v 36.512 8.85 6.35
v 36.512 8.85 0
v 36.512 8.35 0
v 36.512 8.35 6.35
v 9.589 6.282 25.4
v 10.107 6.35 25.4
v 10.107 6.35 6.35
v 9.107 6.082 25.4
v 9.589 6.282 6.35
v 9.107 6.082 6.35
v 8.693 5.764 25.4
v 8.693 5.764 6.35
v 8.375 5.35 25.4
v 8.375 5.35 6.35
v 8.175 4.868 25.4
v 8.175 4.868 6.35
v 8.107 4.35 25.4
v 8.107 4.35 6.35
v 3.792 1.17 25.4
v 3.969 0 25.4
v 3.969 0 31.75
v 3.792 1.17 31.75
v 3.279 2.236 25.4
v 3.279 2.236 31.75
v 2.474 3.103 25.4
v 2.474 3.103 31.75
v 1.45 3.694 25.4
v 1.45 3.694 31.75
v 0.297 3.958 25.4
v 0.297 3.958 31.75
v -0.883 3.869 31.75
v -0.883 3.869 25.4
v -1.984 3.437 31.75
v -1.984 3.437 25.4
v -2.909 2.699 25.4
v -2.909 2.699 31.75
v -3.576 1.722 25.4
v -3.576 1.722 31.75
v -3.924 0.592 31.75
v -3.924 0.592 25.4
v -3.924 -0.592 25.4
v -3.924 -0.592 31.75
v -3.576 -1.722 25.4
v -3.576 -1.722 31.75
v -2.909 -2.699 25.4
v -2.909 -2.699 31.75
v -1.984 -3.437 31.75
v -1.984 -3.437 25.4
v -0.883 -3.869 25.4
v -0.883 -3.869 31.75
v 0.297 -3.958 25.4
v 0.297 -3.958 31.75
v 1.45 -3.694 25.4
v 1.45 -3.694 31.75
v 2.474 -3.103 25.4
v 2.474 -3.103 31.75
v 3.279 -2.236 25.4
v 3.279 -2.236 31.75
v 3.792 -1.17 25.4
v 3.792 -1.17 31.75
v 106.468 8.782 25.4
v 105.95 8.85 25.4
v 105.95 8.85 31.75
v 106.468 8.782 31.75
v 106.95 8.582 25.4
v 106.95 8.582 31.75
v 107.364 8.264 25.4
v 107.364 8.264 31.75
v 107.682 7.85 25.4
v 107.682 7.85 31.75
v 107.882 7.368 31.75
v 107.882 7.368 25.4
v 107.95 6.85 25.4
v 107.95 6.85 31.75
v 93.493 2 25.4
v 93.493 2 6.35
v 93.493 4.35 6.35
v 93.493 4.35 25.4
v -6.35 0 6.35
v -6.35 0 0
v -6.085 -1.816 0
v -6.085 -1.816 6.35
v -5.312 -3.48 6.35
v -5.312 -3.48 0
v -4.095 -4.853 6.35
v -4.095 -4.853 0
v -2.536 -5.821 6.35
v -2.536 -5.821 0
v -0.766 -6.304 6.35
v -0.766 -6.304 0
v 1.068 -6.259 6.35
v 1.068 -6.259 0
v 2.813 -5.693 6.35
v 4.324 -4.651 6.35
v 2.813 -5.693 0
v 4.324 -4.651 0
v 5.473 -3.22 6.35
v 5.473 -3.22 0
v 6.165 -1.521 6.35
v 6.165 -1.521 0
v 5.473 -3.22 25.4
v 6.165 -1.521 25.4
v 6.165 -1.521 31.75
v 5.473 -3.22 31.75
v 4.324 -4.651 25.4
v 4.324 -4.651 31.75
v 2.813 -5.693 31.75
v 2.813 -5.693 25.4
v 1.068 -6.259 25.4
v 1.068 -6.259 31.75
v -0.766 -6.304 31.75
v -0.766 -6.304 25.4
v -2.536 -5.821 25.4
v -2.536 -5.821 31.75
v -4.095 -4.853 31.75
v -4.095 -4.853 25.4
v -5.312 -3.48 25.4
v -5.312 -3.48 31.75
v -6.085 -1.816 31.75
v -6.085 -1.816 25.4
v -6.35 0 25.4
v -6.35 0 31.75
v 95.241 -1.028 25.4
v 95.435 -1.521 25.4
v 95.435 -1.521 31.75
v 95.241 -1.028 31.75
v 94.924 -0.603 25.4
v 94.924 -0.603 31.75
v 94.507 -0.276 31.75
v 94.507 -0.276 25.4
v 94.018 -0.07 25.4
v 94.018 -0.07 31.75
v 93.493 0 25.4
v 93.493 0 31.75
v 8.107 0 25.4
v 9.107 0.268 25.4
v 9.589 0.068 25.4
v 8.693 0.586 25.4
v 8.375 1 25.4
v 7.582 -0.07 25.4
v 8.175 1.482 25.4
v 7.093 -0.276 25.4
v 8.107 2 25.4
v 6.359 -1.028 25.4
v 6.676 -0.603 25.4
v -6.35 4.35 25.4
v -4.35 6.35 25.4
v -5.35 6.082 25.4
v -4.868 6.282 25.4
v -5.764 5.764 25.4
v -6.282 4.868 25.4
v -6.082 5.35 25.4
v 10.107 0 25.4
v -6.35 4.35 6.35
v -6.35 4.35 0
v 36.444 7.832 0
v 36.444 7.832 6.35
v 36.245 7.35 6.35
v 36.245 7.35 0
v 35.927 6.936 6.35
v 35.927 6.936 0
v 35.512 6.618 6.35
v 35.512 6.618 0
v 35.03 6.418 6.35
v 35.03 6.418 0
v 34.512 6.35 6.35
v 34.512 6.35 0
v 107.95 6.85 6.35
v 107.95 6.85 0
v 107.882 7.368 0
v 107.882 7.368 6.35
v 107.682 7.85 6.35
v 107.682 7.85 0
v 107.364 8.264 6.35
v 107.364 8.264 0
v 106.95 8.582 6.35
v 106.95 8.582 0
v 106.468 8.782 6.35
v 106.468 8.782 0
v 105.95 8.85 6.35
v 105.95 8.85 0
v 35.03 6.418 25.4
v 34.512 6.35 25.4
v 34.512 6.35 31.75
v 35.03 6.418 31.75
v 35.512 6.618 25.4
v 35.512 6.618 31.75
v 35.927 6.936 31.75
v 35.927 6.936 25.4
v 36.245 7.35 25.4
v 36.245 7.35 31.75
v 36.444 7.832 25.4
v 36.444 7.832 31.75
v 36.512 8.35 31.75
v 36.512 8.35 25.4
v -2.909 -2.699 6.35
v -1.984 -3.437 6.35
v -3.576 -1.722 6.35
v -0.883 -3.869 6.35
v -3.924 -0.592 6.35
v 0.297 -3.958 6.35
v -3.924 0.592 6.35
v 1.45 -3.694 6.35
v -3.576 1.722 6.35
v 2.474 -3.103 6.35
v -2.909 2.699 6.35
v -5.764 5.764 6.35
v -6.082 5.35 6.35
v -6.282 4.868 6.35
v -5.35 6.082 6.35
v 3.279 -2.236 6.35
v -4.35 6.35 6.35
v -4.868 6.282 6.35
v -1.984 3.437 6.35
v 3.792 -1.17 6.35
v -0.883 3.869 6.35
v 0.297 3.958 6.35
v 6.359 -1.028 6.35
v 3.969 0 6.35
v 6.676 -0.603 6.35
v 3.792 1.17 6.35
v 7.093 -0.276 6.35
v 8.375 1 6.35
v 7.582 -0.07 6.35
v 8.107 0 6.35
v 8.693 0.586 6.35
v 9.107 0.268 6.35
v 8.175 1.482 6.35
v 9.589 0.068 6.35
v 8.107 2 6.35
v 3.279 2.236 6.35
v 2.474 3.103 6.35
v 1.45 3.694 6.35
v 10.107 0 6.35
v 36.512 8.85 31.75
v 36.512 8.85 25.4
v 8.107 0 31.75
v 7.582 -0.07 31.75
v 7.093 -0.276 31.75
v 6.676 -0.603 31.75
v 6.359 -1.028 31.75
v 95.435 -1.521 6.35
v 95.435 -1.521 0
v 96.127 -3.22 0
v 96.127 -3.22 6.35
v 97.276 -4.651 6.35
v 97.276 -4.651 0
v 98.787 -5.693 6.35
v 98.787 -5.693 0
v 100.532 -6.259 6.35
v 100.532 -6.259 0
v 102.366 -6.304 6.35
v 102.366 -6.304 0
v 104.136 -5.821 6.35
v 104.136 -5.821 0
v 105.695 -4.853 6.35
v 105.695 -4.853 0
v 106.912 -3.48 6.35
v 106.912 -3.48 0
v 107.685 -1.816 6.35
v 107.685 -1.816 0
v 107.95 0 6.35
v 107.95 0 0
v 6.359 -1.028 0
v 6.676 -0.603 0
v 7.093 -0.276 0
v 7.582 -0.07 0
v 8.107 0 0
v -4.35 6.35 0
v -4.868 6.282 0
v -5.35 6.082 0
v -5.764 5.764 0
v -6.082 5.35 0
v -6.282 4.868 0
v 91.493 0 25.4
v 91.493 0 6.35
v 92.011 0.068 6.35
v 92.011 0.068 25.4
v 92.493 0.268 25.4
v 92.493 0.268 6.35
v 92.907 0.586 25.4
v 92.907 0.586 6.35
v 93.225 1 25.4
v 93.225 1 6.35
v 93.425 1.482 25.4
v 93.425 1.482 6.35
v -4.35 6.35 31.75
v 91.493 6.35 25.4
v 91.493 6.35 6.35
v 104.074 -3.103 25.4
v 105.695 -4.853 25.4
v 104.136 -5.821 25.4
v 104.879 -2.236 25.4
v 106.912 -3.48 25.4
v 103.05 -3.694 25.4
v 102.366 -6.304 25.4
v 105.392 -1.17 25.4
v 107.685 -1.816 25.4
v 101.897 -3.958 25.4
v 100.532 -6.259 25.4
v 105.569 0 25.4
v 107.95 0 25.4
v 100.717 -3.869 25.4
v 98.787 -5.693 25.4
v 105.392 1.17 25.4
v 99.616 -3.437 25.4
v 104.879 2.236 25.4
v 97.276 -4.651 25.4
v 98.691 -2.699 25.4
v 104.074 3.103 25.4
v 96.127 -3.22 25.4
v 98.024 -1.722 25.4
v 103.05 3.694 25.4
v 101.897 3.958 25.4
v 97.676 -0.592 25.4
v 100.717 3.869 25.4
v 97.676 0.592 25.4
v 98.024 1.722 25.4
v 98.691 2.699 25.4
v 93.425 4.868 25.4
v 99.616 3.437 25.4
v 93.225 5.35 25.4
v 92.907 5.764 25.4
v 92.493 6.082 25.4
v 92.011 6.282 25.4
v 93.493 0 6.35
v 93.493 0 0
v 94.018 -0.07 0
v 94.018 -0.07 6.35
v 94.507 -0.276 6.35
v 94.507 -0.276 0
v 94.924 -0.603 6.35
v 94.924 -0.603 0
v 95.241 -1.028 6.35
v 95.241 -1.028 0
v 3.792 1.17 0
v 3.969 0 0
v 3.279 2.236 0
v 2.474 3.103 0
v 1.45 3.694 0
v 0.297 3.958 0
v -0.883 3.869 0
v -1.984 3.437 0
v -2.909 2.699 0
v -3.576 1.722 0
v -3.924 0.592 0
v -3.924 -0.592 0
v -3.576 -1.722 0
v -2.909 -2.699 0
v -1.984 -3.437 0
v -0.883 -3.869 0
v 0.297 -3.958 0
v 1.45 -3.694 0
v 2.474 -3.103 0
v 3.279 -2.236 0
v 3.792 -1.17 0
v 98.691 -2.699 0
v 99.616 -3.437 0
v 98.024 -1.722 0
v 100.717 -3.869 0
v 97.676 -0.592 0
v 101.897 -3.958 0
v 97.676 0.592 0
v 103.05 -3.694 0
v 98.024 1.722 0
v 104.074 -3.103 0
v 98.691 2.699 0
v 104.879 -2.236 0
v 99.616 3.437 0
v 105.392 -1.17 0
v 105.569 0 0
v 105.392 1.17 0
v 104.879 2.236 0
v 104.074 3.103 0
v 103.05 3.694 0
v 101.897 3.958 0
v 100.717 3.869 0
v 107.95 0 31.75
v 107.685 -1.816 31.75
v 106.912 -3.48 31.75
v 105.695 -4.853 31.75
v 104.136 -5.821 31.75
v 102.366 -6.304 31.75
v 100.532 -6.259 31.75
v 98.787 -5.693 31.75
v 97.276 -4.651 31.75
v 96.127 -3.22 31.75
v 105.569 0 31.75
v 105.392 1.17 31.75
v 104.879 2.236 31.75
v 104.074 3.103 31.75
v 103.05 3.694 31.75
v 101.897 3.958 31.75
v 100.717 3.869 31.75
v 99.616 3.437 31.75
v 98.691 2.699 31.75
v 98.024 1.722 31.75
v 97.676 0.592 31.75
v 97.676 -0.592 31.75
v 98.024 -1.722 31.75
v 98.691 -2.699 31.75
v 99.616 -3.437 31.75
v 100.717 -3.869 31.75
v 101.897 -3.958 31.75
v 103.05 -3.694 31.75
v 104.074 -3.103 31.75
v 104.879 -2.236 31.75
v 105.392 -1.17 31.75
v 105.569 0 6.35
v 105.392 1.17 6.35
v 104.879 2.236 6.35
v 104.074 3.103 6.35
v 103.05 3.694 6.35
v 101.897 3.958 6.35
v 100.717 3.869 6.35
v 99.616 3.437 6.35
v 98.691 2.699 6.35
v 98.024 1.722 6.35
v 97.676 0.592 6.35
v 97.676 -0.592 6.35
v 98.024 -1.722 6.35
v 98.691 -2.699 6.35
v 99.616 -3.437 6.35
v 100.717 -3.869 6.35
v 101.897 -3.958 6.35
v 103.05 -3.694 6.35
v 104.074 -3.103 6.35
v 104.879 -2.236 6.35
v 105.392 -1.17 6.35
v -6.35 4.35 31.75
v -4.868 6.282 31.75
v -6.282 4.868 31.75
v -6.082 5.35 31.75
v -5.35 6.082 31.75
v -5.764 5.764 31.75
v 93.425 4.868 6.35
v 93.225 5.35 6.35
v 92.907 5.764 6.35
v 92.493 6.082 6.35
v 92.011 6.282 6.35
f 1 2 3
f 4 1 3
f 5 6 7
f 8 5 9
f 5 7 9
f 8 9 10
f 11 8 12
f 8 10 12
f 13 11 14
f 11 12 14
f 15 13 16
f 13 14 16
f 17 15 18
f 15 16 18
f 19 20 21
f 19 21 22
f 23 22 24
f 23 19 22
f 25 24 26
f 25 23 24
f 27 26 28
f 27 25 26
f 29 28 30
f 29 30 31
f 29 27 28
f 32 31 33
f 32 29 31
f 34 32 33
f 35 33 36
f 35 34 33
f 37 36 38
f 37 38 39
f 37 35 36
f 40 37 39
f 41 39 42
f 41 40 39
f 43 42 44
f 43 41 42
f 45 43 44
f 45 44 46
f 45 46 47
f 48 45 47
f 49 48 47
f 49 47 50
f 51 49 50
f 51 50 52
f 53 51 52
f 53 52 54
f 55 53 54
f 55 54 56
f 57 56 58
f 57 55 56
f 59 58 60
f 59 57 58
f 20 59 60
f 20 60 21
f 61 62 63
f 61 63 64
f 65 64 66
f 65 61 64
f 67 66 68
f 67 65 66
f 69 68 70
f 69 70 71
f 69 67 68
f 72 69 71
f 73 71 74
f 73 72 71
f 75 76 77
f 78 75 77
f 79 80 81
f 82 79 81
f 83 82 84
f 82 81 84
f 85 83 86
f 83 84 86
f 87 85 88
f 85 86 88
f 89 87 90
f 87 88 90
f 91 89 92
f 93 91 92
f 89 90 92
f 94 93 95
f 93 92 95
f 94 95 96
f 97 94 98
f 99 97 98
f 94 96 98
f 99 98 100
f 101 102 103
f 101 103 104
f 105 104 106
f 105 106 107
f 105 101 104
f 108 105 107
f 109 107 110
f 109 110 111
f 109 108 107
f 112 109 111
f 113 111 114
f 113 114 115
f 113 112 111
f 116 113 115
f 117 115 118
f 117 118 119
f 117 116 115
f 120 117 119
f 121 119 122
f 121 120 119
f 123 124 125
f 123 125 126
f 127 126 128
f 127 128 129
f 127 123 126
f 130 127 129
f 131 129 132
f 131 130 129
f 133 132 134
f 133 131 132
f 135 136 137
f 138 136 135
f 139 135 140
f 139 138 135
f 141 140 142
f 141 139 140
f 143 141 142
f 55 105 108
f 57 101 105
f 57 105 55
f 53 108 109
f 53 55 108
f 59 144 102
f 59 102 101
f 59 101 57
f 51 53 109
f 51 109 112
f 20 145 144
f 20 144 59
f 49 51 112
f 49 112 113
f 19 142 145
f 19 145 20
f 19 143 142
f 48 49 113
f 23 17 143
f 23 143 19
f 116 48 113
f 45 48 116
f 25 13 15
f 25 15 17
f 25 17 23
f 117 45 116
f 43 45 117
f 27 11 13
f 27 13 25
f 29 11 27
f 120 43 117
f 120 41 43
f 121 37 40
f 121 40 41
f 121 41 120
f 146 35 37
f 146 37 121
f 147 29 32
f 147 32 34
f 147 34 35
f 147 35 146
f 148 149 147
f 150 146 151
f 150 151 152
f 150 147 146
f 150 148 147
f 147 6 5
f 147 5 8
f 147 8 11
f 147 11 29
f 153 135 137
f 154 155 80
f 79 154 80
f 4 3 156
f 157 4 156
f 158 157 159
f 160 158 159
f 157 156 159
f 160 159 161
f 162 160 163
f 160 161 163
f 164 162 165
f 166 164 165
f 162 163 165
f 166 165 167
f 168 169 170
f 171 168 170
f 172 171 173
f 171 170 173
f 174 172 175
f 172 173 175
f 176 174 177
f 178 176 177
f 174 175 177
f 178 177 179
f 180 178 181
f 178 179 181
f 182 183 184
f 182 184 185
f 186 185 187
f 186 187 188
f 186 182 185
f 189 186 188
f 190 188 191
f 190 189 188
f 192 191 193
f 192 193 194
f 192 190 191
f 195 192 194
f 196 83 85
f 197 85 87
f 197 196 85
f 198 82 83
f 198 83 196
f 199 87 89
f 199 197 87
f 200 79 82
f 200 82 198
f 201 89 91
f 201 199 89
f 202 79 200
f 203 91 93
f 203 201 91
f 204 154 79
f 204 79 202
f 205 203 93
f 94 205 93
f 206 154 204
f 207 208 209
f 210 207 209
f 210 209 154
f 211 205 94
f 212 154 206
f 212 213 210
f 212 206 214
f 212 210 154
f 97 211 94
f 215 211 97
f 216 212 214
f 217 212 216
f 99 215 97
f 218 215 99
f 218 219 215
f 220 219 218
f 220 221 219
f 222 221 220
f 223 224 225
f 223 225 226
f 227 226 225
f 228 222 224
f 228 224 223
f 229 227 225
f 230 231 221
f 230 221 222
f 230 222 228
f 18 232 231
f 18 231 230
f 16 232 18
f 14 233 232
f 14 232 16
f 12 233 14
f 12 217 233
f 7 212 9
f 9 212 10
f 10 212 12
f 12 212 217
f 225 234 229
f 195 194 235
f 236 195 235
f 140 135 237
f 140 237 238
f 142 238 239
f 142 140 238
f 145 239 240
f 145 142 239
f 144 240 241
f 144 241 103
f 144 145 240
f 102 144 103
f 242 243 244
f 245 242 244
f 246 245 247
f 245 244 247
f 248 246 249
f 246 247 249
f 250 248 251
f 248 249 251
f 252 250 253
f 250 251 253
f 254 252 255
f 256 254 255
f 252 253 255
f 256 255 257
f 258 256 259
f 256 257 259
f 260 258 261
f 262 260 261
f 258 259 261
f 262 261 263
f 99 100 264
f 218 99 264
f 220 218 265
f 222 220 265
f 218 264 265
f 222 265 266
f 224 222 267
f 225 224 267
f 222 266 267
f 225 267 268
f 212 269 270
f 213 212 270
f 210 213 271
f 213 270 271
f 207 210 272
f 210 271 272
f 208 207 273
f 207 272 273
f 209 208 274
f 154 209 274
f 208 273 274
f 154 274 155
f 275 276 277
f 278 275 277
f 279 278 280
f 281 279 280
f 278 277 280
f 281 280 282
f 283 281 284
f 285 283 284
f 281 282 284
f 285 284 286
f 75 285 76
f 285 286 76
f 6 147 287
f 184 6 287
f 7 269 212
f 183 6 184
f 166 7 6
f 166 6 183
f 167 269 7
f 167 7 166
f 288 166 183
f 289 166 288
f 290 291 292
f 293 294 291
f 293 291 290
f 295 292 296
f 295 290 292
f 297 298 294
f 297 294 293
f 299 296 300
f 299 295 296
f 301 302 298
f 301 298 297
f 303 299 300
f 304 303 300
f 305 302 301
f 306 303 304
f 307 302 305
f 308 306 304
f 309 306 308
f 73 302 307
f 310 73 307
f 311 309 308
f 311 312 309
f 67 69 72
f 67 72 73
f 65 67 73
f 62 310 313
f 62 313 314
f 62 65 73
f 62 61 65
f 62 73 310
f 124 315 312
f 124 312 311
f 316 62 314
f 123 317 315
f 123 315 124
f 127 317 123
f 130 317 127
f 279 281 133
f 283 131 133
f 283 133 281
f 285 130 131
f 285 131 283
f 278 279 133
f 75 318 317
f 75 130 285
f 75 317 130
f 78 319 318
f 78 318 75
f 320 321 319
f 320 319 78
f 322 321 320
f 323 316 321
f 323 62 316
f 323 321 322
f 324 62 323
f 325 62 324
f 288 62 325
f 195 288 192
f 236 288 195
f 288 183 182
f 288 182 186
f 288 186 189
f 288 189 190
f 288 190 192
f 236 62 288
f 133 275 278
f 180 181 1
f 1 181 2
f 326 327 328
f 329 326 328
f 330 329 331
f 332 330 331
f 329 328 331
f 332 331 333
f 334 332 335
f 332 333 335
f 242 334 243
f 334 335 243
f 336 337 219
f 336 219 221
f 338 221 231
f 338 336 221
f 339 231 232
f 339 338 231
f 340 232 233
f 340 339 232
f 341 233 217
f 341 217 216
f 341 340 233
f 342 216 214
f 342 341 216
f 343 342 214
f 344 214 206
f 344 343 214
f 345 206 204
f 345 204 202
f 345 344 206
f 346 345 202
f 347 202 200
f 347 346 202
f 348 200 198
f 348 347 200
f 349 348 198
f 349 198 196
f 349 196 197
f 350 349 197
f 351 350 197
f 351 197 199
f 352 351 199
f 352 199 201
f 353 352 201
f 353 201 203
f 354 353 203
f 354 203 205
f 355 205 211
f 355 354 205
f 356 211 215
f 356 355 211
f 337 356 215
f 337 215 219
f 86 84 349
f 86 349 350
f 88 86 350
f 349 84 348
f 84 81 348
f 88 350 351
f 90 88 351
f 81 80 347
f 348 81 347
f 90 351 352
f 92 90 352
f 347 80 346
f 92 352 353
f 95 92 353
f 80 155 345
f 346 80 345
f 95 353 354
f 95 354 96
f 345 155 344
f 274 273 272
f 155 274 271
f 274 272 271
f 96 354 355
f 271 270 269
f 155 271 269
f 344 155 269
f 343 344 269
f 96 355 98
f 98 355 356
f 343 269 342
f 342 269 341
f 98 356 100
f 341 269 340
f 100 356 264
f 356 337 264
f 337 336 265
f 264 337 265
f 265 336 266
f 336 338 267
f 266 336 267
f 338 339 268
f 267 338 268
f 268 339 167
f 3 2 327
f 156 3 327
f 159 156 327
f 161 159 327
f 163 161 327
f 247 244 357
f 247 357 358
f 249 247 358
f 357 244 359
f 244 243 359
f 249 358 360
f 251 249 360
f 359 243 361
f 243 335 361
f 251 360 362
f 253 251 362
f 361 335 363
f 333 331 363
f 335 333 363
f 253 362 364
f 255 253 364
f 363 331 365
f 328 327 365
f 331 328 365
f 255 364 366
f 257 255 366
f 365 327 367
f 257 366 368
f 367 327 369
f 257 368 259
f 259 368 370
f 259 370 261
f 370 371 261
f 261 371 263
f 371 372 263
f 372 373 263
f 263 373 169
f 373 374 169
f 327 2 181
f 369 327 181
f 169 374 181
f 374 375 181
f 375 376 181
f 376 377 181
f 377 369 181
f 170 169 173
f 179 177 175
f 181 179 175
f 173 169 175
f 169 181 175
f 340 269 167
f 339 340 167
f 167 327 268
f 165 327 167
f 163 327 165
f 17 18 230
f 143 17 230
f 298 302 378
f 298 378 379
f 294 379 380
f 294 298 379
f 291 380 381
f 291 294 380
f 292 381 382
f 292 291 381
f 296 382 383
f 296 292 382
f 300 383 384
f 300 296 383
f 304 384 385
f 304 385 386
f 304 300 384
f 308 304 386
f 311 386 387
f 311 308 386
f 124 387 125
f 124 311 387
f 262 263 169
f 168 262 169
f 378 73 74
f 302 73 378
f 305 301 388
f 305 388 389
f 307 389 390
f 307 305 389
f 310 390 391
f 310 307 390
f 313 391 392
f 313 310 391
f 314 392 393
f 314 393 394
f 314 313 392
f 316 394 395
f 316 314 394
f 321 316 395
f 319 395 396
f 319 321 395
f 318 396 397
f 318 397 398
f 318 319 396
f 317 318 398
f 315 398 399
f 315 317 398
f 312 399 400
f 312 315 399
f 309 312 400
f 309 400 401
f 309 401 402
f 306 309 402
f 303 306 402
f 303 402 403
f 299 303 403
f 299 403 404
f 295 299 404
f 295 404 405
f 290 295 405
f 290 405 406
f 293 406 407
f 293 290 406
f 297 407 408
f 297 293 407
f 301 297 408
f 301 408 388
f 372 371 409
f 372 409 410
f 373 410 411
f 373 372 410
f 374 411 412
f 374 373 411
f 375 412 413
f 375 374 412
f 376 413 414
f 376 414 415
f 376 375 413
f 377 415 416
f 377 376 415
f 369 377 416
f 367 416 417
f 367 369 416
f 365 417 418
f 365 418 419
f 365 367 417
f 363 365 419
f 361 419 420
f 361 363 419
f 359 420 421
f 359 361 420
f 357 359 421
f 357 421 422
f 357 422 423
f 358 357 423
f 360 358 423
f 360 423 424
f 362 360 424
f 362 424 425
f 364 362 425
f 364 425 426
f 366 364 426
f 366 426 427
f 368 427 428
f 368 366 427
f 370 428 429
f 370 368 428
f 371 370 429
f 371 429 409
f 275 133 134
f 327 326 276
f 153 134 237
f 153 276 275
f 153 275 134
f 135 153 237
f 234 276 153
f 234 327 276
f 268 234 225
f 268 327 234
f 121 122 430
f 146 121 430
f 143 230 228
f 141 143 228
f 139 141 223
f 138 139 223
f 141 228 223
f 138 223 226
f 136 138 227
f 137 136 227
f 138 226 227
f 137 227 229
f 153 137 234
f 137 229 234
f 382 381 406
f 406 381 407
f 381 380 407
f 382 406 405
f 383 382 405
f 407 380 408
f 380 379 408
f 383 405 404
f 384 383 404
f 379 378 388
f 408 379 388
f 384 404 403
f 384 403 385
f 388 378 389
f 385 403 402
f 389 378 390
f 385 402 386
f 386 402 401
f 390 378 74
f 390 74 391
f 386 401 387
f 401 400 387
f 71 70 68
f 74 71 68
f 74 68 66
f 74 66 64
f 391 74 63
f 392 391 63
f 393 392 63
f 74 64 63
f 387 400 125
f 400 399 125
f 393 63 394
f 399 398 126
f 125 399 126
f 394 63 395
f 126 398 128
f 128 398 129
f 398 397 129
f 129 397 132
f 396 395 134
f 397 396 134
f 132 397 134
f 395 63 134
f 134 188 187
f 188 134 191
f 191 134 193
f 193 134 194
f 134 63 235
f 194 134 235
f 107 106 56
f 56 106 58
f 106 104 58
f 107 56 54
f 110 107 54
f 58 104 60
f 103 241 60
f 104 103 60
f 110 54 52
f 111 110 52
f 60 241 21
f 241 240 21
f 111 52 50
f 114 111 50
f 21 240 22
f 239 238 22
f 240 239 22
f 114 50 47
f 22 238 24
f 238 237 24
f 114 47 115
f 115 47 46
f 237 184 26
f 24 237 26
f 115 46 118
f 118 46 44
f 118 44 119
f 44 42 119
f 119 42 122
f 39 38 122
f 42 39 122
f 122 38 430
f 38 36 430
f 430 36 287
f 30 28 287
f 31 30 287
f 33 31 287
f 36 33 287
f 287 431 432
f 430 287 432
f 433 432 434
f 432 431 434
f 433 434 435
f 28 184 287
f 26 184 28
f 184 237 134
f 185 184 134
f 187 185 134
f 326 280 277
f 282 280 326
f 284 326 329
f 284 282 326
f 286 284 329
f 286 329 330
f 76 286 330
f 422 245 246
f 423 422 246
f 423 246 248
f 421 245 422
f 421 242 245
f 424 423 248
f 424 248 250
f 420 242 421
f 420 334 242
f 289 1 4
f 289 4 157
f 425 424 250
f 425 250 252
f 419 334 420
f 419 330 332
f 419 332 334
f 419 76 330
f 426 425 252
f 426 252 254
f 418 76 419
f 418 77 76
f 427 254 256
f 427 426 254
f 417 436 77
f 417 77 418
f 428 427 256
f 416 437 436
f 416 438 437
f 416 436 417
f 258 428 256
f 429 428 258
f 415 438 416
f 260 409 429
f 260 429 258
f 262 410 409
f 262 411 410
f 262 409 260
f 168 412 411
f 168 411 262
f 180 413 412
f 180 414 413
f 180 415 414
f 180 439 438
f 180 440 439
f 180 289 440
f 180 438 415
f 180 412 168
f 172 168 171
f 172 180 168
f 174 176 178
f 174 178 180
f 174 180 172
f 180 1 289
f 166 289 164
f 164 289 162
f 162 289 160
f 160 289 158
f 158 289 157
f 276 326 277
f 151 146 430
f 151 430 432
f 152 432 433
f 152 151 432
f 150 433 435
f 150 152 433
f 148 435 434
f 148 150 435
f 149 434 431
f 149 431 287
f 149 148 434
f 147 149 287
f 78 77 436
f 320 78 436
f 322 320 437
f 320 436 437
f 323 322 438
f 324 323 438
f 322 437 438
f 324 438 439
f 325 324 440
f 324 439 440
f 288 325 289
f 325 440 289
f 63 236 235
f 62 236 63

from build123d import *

# Parameters (mm, degrees)
SKETCH1_R           = 3.96875
BOSS_EXTRUDE1_DEPTH = 6.35
BOSS_EXTRUDE2_DEPTH = 19.05
SKETCH4_R           = 3.96875
BOSS_EXTRUDE3_DEPTH = 6.35


with BuildPart() as part:
    # Sketch1 → Boss-Extrude1 (new body)
    with BuildSketch(Plane.XY):
        with BuildLine():
            Line((105.95, 8.85), (36.5125, 8.85))
            Line((36.5125, 8.85), (36.5125, 8.35))
            ThreePointArc((36.5125, 8.35), (35.926713562, 6.935786438), (34.5125, 6.35))
            Line((34.5125, 6.35), (-4.35, 6.35))
            ThreePointArc((-4.35, 6.35), (-5.764213562, 5.764213562), (-6.35, 4.35))
            Line((-6.35, 4.35), (-6.35, 0))
            ThreePointArc((-6.35, 0), (-4.490128061, -4.490128061), (0, -6.35))
            ThreePointArc((0, -6.35), (3.915636357, -4.999029097), (6.165159082, -1.520958084))
            ThreePointArc((6.165159082, -1.520958084), (6.873670176, -0.425502647), (8.10694147, 0))
            Line((8.10694147, 0), (93.49305853, 0))
            ThreePointArc((93.49305853, 0), (94.726329824, -0.425502647), (95.434840918, -1.520958084))
            ThreePointArc((95.434840918, -1.520958084), (97.684363643, -4.999029097), (101.6, -6.35))
            ThreePointArc((101.6, -6.35), (106.090128061, -4.490128061), (107.95, 0))
            Line((107.95, 0), (107.95, 6.85))
            ThreePointArc((107.95, 6.85), (107.364213562, 8.264213562), (105.95, 8.85))
        make_face()
        Circle(SKETCH1_R, mode=Mode.SUBTRACT)
        with Locations((101.6, 0)):
            Circle(SKETCH1_R, mode=Mode.SUBTRACT)
    extrude(amount=BOSS_EXTRUDE1_DEPTH)

    # Sketch3 → Boss-Extrude2 (add)
    with BuildSketch(Plane.XY.offset(6.35)):
        with BuildLine():
            Line((91.49305853, 6.35), (10.10694147, 6.35))
            ThreePointArc((10.10694147, 6.35), (8.692727908, 5.764213562), (8.10694147, 4.35))
            Line((8.10694147, 4.35), (8.10694147, 2))
            ThreePointArc((8.10694147, 2), (8.692727908, 0.585786438), (10.10694147, 0))
            Line((10.10694147, 0), (91.49305853, 0))
            ThreePointArc((91.49305853, 0), (92.907272092, 0.585786438), (93.49305853, 2))
            Line((93.49305853, 2), (93.49305853, 4.35))
            ThreePointArc((93.49305853, 4.35), (92.907272092, 5.764213562), (91.49305853, 6.35))
        make_face()
    extrude(amount=BOSS_EXTRUDE2_DEPTH)

    # Sketch4 → Boss-Extrude3 (add)
    with BuildSketch(Plane.XY.offset(25.4)):
        with BuildLine():
            Line((-4.35, 6.35), (34.5125, 6.35))
            ThreePointArc((34.5125, 6.35), (35.926713562, 6.935786438), (36.5125, 8.35))
            Line((36.5125, 8.35), (36.5125, 8.85))
            Line((36.5125, 8.85), (105.95, 8.85))
            ThreePointArc((105.95, 8.85), (107.364213562, 8.264213562), (107.95, 6.85))
            Line((107.95, 6.85), (107.95, 0))
            ThreePointArc((107.95, 0), (106.090128061, -4.490128061), (101.6, -6.35))
            ThreePointArc((101.6, -6.35), (97.684363643, -4.999029097), (95.434840918, -1.520958084))
            ThreePointArc((95.434840918, -1.520958084), (94.726329824, -0.425502647), (93.49305853, 0))
            Line((93.49305853, 0), (8.10694147, 0))
            ThreePointArc((8.10694147, 0), (6.873670176, -0.425502647), (6.165159082, -1.520958084))
            ThreePointArc((6.165159082, -1.520958084), (3.915636357, -4.999029097), (0, -6.35))
            ThreePointArc((0, -6.35), (-4.490128061, -4.490128061), (-6.35, 0))
            Line((-6.35, 0), (-6.35, 4.35))
            ThreePointArc((-6.35, 4.35), (-5.764213562, 5.764213562), (-4.35, 6.35))
        make_face()
        Circle(SKETCH4_R, mode=Mode.SUBTRACT)
        with Locations((101.6, 0)):
            Circle(SKETCH4_R, mode=Mode.SUBTRACT)
    extrude(amount=BOSS_EXTRUDE3_DEPTH)


solid = part.part
